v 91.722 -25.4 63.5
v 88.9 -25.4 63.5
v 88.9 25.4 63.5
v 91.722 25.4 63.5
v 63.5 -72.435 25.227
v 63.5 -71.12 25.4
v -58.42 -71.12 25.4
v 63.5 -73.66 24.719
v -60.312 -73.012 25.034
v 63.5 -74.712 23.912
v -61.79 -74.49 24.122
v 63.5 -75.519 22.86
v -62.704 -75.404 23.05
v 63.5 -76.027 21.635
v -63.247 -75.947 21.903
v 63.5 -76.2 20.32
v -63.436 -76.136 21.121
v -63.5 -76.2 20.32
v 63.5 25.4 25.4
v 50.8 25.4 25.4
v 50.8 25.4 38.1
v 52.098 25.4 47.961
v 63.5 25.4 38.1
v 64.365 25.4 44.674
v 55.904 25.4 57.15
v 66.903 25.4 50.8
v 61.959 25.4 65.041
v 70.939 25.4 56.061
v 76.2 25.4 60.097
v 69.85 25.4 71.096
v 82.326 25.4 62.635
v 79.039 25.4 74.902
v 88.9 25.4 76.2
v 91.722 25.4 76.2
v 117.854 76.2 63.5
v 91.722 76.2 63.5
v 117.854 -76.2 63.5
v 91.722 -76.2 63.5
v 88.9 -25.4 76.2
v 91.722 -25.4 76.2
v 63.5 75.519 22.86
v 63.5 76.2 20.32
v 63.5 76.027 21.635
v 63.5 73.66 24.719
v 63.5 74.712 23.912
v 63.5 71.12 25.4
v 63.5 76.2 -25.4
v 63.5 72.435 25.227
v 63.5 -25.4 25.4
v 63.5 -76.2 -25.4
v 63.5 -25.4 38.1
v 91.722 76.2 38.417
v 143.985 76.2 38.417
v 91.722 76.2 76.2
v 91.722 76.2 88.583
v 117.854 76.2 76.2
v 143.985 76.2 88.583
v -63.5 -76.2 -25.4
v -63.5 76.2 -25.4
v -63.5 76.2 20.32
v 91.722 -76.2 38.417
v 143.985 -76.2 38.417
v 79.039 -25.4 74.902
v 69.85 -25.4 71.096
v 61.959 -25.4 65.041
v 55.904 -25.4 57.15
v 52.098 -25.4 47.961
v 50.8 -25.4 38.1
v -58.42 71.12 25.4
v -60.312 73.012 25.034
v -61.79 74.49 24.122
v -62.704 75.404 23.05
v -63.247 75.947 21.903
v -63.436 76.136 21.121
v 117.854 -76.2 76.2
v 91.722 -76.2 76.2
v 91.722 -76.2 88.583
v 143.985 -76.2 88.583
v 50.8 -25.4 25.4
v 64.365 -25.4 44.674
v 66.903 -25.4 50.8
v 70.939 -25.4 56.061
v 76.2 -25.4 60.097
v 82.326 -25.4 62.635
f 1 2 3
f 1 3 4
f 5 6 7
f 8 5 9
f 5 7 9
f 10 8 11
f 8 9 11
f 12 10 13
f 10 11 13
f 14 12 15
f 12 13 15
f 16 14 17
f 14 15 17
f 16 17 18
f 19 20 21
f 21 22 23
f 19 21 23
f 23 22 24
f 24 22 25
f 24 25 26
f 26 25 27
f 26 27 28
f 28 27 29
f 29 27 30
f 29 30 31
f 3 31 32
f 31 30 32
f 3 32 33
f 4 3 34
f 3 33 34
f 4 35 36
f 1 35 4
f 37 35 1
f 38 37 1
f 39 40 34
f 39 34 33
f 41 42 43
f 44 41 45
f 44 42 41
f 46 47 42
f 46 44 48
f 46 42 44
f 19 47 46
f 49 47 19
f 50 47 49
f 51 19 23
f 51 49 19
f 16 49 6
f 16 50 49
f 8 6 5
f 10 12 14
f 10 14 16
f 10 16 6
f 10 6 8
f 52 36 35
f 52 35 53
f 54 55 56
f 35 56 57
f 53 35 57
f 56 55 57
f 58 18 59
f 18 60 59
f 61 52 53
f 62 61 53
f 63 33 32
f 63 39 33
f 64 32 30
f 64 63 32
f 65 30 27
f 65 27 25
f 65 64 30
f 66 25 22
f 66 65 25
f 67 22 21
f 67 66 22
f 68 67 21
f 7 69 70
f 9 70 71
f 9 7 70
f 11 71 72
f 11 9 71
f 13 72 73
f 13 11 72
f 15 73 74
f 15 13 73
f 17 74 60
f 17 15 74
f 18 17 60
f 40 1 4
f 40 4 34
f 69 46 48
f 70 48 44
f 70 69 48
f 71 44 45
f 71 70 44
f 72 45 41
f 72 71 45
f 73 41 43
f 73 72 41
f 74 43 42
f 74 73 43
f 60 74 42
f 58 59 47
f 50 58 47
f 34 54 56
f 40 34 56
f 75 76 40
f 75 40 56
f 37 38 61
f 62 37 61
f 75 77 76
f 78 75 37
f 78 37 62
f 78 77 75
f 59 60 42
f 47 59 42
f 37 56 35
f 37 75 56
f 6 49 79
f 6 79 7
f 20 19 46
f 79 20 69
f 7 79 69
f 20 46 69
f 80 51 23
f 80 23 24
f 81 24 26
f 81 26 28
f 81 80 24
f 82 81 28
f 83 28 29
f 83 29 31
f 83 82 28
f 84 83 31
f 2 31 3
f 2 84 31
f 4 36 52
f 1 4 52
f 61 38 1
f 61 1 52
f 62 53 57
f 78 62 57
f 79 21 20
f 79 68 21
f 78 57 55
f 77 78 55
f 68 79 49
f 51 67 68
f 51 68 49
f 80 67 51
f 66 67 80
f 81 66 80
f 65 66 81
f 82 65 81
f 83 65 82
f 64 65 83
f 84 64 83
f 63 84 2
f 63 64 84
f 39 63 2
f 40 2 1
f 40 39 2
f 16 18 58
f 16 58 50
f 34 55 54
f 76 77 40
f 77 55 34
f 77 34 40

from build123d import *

# Parameters (mm, degrees)
F1_DEPTH = 25.4
F2_DEPTH = 76.2
F3_R     = 5.08


with BuildPart() as f1:
    # F0 (on Front) → F1 (new body, symmetric)
    with BuildSketch(Plane.XZ):
        with BuildLine():
            Line((50.8, 25.4), (63.5, 25.4))
            Line((63.5, 25.4), (63.5, 38.1))
            ThreePointArc((63.5, 38.1), (70.939488, 56.060512), (88.9, 63.5))
            Line((88.9, 63.5), (91.722063, 63.5))
            Line((91.722063, 63.5), (91.722063, 76.2))
            Line((91.722063, 76.2), (88.9, 76.2))
            ThreePointArc((88.9, 76.2), (61.959232, 65.040768), (50.8, 38.1))
            Line((50.8, 38.1), (50.8, 25.4))
        make_face()
    extrude(amount=F1_DEPTH, both=True)

    # F0 (on Front) → F2 (join, symmetric)
    with BuildSketch(Plane.XZ):
        Polygon((63.5, -25.4), (63.5, 25.4), (50.8, 25.4), (-63.5, 25.4), (-63.5, -25.4), align=None)
        Polygon((117.853607, 63.5), (91.722063, 63.5), (91.722063, 38.416864), (143.98515, 38.416864), (143.98515, 88.583136), (91.722063, 88.583136), (91.722063, 76.2), (117.853607, 76.2), align=None)
    extrude(amount=F2_DEPTH, both=True)

    # F3
    f3_edges = [f1.edges().sort_by_distance(p)[0] for p in [
        (0, -76.2, 25.4),
        (-63.5, 0, 25.4),
        (0, 76.2, 25.4),
    ]]
    fillet(f3_edges, radius=F3_R)


solid = f1.part
